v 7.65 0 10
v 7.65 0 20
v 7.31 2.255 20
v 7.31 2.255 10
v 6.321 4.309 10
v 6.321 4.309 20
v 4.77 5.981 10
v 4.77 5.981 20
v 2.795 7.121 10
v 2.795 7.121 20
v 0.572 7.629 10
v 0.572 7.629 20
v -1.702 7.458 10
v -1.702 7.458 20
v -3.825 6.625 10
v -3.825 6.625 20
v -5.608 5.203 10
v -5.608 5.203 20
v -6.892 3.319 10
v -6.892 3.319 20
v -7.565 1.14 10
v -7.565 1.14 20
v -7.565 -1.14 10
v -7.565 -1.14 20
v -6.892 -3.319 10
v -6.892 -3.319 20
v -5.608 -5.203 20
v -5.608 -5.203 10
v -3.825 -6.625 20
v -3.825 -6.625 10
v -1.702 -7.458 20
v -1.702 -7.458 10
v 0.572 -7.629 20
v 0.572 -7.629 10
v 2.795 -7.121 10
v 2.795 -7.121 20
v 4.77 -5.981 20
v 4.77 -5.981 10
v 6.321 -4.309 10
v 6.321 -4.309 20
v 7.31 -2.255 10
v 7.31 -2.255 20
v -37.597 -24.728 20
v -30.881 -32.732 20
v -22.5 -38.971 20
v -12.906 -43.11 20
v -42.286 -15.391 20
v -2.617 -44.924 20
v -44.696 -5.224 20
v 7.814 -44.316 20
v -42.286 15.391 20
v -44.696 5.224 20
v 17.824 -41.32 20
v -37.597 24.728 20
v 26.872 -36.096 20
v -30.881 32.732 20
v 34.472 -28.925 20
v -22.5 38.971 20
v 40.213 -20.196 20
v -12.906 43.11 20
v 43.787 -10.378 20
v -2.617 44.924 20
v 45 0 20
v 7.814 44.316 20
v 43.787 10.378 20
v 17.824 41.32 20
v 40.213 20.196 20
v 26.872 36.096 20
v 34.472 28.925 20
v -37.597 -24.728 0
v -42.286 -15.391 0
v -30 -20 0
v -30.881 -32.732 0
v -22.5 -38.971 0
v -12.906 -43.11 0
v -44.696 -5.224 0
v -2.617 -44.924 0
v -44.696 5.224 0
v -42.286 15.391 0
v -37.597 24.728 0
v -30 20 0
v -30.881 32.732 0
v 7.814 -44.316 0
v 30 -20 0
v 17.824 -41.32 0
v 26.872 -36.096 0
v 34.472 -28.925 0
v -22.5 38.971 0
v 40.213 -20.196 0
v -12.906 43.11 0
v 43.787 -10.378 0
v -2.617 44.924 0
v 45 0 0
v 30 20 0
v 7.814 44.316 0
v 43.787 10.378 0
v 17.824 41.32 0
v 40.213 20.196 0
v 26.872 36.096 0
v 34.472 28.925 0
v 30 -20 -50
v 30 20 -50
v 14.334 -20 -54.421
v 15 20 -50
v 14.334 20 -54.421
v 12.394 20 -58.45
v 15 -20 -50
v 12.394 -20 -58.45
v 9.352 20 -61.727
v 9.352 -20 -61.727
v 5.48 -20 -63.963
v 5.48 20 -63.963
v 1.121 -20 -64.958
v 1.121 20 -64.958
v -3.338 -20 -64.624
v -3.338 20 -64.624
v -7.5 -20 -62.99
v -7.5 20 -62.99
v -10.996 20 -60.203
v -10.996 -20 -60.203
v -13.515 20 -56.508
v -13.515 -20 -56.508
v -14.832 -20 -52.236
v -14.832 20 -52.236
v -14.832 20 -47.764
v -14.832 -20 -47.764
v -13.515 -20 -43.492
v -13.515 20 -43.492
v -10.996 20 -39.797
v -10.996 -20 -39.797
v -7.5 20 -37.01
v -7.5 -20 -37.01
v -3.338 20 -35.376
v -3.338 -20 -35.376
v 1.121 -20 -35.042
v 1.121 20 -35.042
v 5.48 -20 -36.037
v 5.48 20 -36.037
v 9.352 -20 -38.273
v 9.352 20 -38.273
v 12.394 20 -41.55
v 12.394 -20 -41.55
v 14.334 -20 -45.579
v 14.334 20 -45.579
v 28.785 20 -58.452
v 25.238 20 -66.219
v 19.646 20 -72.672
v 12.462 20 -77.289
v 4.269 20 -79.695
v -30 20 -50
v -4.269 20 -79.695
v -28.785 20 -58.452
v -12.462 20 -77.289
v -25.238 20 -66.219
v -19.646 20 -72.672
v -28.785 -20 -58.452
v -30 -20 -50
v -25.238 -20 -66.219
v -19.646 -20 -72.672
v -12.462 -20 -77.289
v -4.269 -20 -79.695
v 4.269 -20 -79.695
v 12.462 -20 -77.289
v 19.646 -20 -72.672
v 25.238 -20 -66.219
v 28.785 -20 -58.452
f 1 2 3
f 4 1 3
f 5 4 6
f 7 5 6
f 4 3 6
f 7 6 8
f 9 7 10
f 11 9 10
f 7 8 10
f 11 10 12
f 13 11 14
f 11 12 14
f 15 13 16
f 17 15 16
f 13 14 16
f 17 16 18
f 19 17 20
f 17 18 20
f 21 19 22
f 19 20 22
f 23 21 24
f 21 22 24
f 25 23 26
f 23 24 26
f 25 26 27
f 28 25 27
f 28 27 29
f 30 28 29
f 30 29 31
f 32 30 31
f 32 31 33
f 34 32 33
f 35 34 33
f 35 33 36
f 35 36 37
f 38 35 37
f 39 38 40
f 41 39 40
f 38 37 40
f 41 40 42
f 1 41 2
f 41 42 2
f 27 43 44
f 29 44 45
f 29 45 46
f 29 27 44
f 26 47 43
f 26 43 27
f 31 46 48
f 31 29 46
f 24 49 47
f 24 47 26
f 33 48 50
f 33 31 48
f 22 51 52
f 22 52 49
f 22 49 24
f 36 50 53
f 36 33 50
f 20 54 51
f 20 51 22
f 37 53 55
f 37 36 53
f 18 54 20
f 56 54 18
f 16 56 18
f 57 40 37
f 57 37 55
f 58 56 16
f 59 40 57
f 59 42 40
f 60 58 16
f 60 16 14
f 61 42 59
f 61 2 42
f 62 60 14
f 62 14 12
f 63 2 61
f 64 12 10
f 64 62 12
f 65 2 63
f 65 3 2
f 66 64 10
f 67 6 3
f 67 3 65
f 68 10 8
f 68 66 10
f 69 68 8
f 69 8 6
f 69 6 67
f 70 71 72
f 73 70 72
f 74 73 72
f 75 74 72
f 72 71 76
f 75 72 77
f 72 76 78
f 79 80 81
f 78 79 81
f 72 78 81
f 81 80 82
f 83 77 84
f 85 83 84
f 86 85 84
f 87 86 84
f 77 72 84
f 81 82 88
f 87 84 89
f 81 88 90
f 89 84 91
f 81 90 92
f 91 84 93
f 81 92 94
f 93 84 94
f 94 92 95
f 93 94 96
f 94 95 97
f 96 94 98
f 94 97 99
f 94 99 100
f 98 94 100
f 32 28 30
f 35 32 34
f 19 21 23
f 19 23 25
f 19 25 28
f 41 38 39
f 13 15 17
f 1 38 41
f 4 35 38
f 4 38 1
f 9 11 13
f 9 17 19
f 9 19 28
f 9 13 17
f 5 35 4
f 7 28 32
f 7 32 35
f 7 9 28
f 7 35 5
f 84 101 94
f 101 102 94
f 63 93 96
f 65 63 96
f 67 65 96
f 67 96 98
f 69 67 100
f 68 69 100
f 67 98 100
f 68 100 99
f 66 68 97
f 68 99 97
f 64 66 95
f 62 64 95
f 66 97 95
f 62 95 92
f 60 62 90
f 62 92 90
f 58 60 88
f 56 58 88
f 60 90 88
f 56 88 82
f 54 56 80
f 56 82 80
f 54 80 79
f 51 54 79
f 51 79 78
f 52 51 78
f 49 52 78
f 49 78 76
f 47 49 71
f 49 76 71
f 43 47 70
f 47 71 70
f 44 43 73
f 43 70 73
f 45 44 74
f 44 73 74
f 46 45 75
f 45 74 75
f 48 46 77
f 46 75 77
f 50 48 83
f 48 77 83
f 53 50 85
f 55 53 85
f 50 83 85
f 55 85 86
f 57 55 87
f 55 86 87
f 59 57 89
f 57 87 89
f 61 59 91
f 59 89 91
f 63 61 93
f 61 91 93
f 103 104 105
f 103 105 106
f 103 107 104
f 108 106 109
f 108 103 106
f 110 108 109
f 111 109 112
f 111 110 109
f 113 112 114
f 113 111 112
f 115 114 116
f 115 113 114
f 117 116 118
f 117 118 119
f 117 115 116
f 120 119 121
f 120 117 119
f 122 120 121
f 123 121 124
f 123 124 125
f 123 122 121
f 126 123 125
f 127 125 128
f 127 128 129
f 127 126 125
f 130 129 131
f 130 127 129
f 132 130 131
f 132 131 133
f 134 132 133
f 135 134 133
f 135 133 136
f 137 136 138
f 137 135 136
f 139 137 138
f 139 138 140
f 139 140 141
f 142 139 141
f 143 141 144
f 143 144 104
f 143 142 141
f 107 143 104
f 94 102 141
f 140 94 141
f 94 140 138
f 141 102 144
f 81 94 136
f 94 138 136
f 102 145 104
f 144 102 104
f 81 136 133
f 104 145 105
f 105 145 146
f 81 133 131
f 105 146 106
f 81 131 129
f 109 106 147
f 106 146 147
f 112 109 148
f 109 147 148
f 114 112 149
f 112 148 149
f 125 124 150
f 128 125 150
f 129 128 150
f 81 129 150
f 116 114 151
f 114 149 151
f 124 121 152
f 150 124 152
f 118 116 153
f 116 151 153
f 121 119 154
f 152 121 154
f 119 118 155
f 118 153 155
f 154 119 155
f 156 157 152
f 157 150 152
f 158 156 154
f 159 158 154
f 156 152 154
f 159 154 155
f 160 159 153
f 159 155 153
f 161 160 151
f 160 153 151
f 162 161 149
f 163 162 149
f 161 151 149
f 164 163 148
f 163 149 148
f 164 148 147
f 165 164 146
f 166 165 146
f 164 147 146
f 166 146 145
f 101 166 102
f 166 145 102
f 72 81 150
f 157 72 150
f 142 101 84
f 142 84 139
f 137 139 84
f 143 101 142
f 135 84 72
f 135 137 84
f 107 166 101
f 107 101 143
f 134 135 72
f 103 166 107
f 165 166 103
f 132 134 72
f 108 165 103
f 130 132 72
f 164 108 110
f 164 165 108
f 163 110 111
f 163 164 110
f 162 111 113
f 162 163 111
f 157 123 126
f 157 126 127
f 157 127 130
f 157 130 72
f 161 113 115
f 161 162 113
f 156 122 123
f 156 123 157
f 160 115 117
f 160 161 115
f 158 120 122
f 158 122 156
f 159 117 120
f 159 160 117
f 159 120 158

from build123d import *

# Parameters (mm, degrees)
SKETCH_1_R          = 15
EXTRUDE_1_DEPTH     = 20
SKETCH_2_R          = 45
EXTRUDE_2_DEPTH     = 20
SKETCH_3_R          = 7.65
CUT_EXTRUDE_1_DEPTH = 10


with BuildPart() as part:
    # 草图1 → 凸台-拉伸1 (new body, symmetric)
    with BuildSketch(Plane(origin=(0, 0, 0), x_dir=(1, 0, 0), z_dir=(0, 1, 0))):
        with BuildLine():
            Line((-30, 0), (-30, 50))
            ThreePointArc((-30, 50), (0, 80), (30, 50))
            Line((30, 50), (30, 0))
            Line((30, 0), (-30, 0))
        make_face()
        with Locations((0, 50)):
            Circle(SKETCH_1_R, mode=Mode.SUBTRACT)
    extrude(amount=EXTRUDE_1_DEPTH, both=True)

    # 草图2 → 凸台-拉伸2 (add)
    with BuildSketch(Plane.XY):
        Circle(SKETCH_2_R)
    extrude(amount=EXTRUDE_2_DEPTH)

    # 草图3 → 切除-拉伸1 (cut)
    with BuildSketch(Plane.XY.offset(20)):
        Circle(SKETCH_3_R)
    extrude(amount=-CUT_EXTRUDE_1_DEPTH, mode=Mode.SUBTRACT)


solid = part.part
